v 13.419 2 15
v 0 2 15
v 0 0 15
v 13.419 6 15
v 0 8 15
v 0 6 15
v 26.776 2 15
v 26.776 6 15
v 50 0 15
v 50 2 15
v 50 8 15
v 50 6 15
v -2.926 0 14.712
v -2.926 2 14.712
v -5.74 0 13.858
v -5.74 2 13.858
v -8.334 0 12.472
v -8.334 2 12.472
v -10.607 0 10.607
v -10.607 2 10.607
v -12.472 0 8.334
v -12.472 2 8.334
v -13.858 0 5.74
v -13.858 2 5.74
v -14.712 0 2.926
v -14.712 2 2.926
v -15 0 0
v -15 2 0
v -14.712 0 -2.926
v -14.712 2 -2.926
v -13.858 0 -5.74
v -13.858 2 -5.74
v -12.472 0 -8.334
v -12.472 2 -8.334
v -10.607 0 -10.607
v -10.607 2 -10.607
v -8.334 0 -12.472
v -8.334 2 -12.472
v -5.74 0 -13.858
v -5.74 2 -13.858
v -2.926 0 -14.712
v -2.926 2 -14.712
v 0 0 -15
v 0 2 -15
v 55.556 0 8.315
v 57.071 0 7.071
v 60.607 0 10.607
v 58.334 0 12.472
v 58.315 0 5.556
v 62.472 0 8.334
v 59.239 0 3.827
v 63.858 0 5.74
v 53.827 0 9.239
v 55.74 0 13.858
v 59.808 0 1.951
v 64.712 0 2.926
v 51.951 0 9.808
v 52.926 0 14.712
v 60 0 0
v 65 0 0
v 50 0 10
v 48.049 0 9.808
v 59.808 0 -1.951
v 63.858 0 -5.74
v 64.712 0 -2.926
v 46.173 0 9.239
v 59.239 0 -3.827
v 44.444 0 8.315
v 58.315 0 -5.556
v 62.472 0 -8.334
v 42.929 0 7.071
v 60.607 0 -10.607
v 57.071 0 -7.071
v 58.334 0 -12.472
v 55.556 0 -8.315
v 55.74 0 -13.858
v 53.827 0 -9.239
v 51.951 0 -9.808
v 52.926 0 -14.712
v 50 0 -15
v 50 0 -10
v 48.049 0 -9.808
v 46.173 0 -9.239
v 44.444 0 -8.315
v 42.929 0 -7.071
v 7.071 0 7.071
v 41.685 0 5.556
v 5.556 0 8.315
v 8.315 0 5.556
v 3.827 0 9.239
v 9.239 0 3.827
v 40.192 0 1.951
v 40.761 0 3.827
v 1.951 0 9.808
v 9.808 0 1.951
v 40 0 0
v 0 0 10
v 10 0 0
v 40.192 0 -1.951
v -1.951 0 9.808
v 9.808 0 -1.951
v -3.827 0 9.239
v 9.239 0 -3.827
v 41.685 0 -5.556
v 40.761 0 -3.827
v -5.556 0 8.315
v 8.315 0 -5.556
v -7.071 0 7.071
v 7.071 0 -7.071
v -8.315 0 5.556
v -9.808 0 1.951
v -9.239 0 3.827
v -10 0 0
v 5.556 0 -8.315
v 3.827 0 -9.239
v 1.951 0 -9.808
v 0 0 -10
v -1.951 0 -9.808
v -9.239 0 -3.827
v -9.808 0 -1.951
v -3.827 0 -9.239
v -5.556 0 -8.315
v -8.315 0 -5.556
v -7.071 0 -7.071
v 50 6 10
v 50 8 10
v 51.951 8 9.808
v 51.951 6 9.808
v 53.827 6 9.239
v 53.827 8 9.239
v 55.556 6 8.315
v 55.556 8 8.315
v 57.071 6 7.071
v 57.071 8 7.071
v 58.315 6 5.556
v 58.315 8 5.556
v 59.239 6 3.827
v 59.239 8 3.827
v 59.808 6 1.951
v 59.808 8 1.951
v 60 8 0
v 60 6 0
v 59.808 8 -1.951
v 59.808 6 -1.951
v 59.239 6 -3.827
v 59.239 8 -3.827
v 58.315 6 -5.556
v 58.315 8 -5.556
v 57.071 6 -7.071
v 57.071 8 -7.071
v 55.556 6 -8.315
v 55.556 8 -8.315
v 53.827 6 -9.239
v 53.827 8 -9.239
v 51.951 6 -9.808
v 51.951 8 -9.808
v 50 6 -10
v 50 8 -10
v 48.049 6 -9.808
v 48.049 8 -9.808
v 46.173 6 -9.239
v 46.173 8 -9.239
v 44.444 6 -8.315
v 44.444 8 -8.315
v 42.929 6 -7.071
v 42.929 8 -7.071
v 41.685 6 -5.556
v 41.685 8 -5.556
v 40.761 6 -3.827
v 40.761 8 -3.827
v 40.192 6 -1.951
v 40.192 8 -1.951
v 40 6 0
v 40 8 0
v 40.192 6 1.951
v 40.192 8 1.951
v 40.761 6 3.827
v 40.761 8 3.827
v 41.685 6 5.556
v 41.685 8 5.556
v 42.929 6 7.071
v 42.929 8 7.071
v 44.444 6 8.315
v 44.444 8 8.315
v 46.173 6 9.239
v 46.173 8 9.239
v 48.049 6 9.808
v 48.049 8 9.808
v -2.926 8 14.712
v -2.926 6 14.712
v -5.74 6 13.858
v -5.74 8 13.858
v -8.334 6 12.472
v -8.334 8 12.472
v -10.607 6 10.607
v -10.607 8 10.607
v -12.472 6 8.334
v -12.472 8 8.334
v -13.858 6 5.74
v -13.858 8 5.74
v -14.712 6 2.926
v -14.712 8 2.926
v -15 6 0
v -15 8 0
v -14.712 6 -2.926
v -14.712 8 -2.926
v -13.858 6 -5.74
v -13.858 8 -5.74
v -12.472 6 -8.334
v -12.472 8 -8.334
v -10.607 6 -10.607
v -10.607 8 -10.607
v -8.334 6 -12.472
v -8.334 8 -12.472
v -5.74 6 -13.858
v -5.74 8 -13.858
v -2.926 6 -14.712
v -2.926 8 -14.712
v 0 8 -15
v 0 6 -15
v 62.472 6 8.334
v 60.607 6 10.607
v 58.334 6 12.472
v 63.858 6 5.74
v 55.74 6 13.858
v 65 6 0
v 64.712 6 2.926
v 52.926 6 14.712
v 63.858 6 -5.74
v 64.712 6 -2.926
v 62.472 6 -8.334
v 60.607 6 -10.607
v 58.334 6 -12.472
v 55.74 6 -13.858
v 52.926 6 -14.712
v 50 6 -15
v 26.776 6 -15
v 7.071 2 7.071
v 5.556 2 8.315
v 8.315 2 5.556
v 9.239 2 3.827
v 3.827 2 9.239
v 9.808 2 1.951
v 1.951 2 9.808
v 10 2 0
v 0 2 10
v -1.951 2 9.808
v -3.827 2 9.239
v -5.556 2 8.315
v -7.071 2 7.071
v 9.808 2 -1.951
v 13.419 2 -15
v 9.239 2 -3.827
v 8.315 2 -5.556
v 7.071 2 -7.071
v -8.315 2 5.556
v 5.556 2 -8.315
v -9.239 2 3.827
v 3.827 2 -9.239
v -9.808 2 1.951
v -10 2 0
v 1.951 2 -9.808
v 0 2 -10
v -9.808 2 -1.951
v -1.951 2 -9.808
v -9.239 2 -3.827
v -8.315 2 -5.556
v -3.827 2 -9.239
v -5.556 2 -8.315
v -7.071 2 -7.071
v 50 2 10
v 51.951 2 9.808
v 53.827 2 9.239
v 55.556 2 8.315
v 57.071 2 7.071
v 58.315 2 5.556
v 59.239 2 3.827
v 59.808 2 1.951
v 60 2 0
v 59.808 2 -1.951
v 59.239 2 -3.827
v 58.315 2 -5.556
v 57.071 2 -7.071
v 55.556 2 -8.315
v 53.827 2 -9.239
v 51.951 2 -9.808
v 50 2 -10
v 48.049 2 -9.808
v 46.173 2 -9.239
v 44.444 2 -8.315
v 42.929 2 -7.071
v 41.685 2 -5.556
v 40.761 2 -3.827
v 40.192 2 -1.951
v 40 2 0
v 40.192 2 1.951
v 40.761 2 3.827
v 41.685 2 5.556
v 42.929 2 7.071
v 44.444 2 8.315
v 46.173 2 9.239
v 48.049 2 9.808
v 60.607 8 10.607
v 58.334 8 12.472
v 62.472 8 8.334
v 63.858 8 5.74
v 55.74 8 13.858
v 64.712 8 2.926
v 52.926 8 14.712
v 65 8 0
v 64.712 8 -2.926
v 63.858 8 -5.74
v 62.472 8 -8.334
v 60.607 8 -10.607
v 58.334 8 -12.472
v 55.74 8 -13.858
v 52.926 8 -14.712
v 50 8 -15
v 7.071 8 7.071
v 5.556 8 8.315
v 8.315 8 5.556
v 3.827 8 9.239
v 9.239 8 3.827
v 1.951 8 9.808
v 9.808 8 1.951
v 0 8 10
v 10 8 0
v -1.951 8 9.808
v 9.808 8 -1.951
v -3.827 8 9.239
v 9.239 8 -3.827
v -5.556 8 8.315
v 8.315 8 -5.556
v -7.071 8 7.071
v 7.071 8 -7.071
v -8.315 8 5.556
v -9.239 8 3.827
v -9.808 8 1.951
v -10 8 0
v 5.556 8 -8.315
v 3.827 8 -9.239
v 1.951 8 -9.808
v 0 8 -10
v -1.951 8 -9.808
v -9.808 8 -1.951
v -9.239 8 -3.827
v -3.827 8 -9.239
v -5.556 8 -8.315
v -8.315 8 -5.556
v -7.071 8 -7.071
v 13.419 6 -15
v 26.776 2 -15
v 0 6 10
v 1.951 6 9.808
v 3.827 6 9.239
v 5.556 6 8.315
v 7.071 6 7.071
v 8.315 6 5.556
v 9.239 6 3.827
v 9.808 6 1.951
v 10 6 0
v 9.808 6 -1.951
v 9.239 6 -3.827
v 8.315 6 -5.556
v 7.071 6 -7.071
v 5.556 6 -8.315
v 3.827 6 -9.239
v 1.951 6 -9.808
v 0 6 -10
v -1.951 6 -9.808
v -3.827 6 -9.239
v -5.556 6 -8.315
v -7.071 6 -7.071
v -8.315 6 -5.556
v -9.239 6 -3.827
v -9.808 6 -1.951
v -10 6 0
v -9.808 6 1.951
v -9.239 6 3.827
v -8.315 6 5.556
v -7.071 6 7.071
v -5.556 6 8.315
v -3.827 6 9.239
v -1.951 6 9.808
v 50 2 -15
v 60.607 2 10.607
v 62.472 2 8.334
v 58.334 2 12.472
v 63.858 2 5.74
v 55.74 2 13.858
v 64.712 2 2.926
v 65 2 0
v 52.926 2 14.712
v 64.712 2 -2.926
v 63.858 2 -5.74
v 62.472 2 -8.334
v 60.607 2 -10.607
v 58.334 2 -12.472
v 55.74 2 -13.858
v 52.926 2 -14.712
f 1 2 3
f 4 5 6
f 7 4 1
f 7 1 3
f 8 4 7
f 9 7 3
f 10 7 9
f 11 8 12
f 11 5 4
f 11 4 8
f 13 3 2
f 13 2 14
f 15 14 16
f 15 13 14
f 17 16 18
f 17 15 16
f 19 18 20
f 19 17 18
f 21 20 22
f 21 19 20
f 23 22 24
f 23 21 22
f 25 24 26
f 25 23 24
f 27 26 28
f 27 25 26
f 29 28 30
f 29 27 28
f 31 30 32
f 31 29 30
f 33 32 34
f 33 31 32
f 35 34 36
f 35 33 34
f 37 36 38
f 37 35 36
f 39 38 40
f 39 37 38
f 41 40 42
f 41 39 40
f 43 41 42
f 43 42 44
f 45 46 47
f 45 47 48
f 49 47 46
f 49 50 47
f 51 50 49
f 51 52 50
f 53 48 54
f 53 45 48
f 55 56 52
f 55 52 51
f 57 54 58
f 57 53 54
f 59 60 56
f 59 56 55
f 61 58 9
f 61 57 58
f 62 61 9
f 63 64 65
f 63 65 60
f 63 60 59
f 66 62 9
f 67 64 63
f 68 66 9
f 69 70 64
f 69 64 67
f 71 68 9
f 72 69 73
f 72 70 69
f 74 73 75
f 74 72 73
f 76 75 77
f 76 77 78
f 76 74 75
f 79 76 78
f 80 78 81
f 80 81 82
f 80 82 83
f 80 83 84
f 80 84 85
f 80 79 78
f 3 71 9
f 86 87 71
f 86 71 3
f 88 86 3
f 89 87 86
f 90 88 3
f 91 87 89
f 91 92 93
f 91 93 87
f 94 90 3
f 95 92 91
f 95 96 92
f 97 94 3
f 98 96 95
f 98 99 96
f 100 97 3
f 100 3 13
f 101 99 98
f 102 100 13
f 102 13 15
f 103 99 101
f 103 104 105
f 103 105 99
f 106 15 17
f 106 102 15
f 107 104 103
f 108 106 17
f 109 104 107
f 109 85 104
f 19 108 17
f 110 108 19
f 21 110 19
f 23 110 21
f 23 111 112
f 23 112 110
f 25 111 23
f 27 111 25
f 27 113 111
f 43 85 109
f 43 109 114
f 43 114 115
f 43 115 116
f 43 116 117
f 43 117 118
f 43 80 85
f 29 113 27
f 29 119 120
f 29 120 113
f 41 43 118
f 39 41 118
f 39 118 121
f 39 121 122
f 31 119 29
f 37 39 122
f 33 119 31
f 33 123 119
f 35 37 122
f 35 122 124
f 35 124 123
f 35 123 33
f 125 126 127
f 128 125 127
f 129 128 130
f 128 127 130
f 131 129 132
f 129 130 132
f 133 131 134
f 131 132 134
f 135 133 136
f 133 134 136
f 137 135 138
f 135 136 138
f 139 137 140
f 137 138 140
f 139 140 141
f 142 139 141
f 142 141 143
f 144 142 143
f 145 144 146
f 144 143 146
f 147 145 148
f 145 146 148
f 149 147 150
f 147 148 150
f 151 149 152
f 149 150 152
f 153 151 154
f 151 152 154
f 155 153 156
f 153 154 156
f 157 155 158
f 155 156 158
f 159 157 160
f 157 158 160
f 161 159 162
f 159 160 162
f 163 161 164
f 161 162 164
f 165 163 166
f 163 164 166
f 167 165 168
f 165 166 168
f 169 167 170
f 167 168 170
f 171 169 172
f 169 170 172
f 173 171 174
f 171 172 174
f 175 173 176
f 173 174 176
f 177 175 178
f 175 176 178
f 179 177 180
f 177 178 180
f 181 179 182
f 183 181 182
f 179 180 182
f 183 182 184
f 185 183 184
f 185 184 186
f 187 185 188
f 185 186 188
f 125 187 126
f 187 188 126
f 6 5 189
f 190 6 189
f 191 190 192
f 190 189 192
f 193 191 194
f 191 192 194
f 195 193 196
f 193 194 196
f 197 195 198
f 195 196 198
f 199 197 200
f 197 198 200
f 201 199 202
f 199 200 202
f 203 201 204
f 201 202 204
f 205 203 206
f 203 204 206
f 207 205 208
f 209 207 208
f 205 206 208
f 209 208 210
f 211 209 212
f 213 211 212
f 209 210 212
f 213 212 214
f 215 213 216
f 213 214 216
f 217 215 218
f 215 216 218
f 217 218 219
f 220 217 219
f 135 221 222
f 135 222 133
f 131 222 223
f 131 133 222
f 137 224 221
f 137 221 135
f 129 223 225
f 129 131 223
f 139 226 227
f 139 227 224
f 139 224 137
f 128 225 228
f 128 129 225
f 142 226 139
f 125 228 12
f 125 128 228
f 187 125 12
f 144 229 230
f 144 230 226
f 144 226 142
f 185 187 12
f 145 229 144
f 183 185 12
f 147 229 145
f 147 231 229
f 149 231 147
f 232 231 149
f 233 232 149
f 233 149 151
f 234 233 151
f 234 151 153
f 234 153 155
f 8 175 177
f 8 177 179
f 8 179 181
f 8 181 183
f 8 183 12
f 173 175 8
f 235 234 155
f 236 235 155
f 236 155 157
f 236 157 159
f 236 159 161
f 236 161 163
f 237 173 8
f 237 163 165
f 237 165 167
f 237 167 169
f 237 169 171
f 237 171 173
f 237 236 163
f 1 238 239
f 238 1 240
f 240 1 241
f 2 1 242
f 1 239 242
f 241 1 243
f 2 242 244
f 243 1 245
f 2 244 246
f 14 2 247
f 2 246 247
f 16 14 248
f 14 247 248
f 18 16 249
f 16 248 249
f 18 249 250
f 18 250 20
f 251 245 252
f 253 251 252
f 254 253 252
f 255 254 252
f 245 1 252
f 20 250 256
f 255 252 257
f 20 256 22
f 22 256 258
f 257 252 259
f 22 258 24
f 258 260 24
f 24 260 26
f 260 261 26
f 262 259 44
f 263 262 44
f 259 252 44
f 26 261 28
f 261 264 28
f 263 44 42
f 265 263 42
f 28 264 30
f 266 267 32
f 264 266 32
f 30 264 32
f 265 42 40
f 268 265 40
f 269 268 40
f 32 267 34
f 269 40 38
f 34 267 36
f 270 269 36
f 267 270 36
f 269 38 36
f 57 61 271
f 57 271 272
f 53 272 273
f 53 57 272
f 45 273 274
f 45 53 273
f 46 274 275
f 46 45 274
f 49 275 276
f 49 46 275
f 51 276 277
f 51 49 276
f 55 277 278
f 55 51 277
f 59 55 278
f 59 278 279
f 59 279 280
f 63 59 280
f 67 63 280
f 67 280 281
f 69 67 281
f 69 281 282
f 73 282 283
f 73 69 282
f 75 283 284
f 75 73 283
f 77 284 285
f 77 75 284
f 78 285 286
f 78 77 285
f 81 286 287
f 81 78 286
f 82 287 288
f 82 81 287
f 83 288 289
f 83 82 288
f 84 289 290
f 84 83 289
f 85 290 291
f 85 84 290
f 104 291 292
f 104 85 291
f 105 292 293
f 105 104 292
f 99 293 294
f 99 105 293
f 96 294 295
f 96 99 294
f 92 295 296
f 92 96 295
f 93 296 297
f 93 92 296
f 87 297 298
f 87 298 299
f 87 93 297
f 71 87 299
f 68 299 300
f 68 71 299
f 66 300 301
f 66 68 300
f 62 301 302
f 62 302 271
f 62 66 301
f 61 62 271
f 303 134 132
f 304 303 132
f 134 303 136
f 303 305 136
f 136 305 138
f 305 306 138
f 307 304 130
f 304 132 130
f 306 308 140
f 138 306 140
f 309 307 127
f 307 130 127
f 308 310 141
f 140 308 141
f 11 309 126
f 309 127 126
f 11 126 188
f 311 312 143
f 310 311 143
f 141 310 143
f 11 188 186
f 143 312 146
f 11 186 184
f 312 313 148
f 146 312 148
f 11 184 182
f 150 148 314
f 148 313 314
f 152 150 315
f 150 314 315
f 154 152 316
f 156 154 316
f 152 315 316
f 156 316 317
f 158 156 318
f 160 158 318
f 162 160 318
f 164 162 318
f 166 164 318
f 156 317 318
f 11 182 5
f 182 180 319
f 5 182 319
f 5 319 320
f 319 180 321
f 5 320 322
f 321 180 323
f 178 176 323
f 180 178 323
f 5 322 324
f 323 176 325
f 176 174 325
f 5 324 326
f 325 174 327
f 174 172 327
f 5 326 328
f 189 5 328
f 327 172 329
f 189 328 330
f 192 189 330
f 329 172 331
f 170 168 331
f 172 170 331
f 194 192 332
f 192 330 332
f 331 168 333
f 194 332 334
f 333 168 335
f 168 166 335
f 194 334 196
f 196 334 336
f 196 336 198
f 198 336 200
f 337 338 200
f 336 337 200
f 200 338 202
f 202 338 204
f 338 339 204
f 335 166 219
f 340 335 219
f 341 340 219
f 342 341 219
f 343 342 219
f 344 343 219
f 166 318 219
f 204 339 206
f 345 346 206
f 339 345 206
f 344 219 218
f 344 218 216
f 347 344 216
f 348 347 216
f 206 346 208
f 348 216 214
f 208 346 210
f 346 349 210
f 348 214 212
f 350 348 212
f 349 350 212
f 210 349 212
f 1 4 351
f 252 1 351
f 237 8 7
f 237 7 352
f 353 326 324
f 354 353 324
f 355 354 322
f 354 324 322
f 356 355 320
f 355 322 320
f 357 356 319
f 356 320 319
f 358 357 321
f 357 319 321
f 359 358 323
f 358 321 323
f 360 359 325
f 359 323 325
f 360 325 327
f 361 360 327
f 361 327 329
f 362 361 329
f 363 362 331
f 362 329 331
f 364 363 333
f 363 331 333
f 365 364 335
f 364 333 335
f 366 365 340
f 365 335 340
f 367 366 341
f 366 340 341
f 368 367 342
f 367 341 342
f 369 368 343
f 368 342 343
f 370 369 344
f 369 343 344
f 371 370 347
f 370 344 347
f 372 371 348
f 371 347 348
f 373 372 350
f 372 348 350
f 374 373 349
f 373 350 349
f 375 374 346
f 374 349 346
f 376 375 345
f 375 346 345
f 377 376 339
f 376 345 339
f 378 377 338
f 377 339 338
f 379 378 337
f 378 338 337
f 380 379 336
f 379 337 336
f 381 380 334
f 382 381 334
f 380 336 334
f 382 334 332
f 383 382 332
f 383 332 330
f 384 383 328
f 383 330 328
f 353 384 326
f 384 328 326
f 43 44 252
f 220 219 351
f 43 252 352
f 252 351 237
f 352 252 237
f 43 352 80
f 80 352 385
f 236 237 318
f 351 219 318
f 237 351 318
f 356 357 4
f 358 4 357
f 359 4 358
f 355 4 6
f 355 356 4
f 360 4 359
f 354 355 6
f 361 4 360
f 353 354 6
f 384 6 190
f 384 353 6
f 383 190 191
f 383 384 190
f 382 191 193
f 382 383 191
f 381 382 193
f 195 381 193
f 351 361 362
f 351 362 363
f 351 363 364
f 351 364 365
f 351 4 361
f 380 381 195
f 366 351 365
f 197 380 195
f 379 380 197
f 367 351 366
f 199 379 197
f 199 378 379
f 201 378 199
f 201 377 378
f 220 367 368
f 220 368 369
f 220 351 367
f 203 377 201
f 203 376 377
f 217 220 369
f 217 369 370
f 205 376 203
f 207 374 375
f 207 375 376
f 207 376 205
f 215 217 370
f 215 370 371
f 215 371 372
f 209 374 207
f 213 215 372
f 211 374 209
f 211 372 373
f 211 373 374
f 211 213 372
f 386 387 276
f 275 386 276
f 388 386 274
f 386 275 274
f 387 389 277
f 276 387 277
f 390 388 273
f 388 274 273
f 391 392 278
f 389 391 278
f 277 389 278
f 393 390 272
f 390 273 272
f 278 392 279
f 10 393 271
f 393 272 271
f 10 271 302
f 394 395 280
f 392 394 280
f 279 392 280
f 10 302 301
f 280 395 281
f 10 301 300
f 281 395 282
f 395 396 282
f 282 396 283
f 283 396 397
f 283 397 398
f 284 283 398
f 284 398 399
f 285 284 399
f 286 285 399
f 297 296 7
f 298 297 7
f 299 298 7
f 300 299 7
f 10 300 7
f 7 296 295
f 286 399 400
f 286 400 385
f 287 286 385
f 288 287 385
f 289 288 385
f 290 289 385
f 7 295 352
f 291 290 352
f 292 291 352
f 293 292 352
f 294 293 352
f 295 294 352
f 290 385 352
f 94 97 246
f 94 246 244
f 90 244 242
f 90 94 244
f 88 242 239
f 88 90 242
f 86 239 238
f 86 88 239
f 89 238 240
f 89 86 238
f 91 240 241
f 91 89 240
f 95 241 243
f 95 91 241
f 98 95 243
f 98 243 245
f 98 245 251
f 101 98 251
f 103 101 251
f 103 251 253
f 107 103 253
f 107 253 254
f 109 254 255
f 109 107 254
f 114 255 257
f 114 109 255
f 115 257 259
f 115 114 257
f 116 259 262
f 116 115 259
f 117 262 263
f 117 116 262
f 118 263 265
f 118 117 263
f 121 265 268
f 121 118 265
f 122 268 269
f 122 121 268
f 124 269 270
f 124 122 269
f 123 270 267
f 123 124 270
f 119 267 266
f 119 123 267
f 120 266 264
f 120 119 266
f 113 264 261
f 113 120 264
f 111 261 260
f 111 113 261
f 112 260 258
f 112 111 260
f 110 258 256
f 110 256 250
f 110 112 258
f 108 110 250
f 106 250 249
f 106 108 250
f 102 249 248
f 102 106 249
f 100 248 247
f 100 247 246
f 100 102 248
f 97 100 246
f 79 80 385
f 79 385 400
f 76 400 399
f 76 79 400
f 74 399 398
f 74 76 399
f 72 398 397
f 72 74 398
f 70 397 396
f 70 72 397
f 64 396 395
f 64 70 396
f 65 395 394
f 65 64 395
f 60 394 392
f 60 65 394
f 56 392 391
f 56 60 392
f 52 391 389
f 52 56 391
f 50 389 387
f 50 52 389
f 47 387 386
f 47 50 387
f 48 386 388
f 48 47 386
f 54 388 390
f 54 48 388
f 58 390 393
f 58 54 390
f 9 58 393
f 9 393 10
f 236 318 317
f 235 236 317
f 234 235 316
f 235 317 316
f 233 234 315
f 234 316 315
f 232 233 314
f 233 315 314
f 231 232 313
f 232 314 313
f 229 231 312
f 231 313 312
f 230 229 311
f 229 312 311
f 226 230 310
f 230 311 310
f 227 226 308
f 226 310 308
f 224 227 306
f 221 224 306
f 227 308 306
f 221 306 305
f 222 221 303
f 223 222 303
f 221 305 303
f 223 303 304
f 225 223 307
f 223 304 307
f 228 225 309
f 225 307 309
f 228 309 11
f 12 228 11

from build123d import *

# Parameters (mm, degrees)
SKETCH_1_R      = 10
EXTRUDE_1_DEPTH = 2
SKETCH_2_W      = 13.356704287
SKETCH_2_H      = 30
EXTRUDE_2_DEPTH = 2


with BuildPart() as part:
    # 草图1 → 凸台-拉伸1 (new body)
    with BuildSketch(Plane(origin=(0, 0, 0), x_dir=(1, 0, 0), z_dir=(0, 1, 0))):
        with BuildLine():
            Line((0, 15), (50, 15))
            ThreePointArc((50, 15), (65, 0), (50, -15))
            Line((50, -15), (0, -15))
            ThreePointArc((0, -15), (-15, 0), (0, 15))
        make_face()
        with Locations(Location((0, 0, 0), (0, 0, 270))):
            Circle(SKETCH_1_R, mode=Mode.SUBTRACT)
        with Locations(Location((50, 0, 0), (0, 0, 270))):
            Circle(SKETCH_1_R, mode=Mode.SUBTRACT)
    extrude_1 = extrude(amount=EXTRUDE_1_DEPTH)

    # 草图2 → 凸台-拉伸2 (add)
    with BuildSketch(Plane(origin=(0, 2, 0), x_dir=(1, 0, 0), z_dir=(0, 1, 0))):
        with Locations((20.097558378, 0)):
            Rectangle(SKETCH_2_W, SKETCH_2_H)
    extrude_2 = extrude(amount=EXTRUDE_2_DEPTH)

    # 镜向1: 凸台-拉伸1, 凸台-拉伸2 across plane
    add(extrude_1.mirror(Plane.ZX.offset(4)))
    add(extrude_2.mirror(Plane.ZX.offset(4)))


solid = part.part
